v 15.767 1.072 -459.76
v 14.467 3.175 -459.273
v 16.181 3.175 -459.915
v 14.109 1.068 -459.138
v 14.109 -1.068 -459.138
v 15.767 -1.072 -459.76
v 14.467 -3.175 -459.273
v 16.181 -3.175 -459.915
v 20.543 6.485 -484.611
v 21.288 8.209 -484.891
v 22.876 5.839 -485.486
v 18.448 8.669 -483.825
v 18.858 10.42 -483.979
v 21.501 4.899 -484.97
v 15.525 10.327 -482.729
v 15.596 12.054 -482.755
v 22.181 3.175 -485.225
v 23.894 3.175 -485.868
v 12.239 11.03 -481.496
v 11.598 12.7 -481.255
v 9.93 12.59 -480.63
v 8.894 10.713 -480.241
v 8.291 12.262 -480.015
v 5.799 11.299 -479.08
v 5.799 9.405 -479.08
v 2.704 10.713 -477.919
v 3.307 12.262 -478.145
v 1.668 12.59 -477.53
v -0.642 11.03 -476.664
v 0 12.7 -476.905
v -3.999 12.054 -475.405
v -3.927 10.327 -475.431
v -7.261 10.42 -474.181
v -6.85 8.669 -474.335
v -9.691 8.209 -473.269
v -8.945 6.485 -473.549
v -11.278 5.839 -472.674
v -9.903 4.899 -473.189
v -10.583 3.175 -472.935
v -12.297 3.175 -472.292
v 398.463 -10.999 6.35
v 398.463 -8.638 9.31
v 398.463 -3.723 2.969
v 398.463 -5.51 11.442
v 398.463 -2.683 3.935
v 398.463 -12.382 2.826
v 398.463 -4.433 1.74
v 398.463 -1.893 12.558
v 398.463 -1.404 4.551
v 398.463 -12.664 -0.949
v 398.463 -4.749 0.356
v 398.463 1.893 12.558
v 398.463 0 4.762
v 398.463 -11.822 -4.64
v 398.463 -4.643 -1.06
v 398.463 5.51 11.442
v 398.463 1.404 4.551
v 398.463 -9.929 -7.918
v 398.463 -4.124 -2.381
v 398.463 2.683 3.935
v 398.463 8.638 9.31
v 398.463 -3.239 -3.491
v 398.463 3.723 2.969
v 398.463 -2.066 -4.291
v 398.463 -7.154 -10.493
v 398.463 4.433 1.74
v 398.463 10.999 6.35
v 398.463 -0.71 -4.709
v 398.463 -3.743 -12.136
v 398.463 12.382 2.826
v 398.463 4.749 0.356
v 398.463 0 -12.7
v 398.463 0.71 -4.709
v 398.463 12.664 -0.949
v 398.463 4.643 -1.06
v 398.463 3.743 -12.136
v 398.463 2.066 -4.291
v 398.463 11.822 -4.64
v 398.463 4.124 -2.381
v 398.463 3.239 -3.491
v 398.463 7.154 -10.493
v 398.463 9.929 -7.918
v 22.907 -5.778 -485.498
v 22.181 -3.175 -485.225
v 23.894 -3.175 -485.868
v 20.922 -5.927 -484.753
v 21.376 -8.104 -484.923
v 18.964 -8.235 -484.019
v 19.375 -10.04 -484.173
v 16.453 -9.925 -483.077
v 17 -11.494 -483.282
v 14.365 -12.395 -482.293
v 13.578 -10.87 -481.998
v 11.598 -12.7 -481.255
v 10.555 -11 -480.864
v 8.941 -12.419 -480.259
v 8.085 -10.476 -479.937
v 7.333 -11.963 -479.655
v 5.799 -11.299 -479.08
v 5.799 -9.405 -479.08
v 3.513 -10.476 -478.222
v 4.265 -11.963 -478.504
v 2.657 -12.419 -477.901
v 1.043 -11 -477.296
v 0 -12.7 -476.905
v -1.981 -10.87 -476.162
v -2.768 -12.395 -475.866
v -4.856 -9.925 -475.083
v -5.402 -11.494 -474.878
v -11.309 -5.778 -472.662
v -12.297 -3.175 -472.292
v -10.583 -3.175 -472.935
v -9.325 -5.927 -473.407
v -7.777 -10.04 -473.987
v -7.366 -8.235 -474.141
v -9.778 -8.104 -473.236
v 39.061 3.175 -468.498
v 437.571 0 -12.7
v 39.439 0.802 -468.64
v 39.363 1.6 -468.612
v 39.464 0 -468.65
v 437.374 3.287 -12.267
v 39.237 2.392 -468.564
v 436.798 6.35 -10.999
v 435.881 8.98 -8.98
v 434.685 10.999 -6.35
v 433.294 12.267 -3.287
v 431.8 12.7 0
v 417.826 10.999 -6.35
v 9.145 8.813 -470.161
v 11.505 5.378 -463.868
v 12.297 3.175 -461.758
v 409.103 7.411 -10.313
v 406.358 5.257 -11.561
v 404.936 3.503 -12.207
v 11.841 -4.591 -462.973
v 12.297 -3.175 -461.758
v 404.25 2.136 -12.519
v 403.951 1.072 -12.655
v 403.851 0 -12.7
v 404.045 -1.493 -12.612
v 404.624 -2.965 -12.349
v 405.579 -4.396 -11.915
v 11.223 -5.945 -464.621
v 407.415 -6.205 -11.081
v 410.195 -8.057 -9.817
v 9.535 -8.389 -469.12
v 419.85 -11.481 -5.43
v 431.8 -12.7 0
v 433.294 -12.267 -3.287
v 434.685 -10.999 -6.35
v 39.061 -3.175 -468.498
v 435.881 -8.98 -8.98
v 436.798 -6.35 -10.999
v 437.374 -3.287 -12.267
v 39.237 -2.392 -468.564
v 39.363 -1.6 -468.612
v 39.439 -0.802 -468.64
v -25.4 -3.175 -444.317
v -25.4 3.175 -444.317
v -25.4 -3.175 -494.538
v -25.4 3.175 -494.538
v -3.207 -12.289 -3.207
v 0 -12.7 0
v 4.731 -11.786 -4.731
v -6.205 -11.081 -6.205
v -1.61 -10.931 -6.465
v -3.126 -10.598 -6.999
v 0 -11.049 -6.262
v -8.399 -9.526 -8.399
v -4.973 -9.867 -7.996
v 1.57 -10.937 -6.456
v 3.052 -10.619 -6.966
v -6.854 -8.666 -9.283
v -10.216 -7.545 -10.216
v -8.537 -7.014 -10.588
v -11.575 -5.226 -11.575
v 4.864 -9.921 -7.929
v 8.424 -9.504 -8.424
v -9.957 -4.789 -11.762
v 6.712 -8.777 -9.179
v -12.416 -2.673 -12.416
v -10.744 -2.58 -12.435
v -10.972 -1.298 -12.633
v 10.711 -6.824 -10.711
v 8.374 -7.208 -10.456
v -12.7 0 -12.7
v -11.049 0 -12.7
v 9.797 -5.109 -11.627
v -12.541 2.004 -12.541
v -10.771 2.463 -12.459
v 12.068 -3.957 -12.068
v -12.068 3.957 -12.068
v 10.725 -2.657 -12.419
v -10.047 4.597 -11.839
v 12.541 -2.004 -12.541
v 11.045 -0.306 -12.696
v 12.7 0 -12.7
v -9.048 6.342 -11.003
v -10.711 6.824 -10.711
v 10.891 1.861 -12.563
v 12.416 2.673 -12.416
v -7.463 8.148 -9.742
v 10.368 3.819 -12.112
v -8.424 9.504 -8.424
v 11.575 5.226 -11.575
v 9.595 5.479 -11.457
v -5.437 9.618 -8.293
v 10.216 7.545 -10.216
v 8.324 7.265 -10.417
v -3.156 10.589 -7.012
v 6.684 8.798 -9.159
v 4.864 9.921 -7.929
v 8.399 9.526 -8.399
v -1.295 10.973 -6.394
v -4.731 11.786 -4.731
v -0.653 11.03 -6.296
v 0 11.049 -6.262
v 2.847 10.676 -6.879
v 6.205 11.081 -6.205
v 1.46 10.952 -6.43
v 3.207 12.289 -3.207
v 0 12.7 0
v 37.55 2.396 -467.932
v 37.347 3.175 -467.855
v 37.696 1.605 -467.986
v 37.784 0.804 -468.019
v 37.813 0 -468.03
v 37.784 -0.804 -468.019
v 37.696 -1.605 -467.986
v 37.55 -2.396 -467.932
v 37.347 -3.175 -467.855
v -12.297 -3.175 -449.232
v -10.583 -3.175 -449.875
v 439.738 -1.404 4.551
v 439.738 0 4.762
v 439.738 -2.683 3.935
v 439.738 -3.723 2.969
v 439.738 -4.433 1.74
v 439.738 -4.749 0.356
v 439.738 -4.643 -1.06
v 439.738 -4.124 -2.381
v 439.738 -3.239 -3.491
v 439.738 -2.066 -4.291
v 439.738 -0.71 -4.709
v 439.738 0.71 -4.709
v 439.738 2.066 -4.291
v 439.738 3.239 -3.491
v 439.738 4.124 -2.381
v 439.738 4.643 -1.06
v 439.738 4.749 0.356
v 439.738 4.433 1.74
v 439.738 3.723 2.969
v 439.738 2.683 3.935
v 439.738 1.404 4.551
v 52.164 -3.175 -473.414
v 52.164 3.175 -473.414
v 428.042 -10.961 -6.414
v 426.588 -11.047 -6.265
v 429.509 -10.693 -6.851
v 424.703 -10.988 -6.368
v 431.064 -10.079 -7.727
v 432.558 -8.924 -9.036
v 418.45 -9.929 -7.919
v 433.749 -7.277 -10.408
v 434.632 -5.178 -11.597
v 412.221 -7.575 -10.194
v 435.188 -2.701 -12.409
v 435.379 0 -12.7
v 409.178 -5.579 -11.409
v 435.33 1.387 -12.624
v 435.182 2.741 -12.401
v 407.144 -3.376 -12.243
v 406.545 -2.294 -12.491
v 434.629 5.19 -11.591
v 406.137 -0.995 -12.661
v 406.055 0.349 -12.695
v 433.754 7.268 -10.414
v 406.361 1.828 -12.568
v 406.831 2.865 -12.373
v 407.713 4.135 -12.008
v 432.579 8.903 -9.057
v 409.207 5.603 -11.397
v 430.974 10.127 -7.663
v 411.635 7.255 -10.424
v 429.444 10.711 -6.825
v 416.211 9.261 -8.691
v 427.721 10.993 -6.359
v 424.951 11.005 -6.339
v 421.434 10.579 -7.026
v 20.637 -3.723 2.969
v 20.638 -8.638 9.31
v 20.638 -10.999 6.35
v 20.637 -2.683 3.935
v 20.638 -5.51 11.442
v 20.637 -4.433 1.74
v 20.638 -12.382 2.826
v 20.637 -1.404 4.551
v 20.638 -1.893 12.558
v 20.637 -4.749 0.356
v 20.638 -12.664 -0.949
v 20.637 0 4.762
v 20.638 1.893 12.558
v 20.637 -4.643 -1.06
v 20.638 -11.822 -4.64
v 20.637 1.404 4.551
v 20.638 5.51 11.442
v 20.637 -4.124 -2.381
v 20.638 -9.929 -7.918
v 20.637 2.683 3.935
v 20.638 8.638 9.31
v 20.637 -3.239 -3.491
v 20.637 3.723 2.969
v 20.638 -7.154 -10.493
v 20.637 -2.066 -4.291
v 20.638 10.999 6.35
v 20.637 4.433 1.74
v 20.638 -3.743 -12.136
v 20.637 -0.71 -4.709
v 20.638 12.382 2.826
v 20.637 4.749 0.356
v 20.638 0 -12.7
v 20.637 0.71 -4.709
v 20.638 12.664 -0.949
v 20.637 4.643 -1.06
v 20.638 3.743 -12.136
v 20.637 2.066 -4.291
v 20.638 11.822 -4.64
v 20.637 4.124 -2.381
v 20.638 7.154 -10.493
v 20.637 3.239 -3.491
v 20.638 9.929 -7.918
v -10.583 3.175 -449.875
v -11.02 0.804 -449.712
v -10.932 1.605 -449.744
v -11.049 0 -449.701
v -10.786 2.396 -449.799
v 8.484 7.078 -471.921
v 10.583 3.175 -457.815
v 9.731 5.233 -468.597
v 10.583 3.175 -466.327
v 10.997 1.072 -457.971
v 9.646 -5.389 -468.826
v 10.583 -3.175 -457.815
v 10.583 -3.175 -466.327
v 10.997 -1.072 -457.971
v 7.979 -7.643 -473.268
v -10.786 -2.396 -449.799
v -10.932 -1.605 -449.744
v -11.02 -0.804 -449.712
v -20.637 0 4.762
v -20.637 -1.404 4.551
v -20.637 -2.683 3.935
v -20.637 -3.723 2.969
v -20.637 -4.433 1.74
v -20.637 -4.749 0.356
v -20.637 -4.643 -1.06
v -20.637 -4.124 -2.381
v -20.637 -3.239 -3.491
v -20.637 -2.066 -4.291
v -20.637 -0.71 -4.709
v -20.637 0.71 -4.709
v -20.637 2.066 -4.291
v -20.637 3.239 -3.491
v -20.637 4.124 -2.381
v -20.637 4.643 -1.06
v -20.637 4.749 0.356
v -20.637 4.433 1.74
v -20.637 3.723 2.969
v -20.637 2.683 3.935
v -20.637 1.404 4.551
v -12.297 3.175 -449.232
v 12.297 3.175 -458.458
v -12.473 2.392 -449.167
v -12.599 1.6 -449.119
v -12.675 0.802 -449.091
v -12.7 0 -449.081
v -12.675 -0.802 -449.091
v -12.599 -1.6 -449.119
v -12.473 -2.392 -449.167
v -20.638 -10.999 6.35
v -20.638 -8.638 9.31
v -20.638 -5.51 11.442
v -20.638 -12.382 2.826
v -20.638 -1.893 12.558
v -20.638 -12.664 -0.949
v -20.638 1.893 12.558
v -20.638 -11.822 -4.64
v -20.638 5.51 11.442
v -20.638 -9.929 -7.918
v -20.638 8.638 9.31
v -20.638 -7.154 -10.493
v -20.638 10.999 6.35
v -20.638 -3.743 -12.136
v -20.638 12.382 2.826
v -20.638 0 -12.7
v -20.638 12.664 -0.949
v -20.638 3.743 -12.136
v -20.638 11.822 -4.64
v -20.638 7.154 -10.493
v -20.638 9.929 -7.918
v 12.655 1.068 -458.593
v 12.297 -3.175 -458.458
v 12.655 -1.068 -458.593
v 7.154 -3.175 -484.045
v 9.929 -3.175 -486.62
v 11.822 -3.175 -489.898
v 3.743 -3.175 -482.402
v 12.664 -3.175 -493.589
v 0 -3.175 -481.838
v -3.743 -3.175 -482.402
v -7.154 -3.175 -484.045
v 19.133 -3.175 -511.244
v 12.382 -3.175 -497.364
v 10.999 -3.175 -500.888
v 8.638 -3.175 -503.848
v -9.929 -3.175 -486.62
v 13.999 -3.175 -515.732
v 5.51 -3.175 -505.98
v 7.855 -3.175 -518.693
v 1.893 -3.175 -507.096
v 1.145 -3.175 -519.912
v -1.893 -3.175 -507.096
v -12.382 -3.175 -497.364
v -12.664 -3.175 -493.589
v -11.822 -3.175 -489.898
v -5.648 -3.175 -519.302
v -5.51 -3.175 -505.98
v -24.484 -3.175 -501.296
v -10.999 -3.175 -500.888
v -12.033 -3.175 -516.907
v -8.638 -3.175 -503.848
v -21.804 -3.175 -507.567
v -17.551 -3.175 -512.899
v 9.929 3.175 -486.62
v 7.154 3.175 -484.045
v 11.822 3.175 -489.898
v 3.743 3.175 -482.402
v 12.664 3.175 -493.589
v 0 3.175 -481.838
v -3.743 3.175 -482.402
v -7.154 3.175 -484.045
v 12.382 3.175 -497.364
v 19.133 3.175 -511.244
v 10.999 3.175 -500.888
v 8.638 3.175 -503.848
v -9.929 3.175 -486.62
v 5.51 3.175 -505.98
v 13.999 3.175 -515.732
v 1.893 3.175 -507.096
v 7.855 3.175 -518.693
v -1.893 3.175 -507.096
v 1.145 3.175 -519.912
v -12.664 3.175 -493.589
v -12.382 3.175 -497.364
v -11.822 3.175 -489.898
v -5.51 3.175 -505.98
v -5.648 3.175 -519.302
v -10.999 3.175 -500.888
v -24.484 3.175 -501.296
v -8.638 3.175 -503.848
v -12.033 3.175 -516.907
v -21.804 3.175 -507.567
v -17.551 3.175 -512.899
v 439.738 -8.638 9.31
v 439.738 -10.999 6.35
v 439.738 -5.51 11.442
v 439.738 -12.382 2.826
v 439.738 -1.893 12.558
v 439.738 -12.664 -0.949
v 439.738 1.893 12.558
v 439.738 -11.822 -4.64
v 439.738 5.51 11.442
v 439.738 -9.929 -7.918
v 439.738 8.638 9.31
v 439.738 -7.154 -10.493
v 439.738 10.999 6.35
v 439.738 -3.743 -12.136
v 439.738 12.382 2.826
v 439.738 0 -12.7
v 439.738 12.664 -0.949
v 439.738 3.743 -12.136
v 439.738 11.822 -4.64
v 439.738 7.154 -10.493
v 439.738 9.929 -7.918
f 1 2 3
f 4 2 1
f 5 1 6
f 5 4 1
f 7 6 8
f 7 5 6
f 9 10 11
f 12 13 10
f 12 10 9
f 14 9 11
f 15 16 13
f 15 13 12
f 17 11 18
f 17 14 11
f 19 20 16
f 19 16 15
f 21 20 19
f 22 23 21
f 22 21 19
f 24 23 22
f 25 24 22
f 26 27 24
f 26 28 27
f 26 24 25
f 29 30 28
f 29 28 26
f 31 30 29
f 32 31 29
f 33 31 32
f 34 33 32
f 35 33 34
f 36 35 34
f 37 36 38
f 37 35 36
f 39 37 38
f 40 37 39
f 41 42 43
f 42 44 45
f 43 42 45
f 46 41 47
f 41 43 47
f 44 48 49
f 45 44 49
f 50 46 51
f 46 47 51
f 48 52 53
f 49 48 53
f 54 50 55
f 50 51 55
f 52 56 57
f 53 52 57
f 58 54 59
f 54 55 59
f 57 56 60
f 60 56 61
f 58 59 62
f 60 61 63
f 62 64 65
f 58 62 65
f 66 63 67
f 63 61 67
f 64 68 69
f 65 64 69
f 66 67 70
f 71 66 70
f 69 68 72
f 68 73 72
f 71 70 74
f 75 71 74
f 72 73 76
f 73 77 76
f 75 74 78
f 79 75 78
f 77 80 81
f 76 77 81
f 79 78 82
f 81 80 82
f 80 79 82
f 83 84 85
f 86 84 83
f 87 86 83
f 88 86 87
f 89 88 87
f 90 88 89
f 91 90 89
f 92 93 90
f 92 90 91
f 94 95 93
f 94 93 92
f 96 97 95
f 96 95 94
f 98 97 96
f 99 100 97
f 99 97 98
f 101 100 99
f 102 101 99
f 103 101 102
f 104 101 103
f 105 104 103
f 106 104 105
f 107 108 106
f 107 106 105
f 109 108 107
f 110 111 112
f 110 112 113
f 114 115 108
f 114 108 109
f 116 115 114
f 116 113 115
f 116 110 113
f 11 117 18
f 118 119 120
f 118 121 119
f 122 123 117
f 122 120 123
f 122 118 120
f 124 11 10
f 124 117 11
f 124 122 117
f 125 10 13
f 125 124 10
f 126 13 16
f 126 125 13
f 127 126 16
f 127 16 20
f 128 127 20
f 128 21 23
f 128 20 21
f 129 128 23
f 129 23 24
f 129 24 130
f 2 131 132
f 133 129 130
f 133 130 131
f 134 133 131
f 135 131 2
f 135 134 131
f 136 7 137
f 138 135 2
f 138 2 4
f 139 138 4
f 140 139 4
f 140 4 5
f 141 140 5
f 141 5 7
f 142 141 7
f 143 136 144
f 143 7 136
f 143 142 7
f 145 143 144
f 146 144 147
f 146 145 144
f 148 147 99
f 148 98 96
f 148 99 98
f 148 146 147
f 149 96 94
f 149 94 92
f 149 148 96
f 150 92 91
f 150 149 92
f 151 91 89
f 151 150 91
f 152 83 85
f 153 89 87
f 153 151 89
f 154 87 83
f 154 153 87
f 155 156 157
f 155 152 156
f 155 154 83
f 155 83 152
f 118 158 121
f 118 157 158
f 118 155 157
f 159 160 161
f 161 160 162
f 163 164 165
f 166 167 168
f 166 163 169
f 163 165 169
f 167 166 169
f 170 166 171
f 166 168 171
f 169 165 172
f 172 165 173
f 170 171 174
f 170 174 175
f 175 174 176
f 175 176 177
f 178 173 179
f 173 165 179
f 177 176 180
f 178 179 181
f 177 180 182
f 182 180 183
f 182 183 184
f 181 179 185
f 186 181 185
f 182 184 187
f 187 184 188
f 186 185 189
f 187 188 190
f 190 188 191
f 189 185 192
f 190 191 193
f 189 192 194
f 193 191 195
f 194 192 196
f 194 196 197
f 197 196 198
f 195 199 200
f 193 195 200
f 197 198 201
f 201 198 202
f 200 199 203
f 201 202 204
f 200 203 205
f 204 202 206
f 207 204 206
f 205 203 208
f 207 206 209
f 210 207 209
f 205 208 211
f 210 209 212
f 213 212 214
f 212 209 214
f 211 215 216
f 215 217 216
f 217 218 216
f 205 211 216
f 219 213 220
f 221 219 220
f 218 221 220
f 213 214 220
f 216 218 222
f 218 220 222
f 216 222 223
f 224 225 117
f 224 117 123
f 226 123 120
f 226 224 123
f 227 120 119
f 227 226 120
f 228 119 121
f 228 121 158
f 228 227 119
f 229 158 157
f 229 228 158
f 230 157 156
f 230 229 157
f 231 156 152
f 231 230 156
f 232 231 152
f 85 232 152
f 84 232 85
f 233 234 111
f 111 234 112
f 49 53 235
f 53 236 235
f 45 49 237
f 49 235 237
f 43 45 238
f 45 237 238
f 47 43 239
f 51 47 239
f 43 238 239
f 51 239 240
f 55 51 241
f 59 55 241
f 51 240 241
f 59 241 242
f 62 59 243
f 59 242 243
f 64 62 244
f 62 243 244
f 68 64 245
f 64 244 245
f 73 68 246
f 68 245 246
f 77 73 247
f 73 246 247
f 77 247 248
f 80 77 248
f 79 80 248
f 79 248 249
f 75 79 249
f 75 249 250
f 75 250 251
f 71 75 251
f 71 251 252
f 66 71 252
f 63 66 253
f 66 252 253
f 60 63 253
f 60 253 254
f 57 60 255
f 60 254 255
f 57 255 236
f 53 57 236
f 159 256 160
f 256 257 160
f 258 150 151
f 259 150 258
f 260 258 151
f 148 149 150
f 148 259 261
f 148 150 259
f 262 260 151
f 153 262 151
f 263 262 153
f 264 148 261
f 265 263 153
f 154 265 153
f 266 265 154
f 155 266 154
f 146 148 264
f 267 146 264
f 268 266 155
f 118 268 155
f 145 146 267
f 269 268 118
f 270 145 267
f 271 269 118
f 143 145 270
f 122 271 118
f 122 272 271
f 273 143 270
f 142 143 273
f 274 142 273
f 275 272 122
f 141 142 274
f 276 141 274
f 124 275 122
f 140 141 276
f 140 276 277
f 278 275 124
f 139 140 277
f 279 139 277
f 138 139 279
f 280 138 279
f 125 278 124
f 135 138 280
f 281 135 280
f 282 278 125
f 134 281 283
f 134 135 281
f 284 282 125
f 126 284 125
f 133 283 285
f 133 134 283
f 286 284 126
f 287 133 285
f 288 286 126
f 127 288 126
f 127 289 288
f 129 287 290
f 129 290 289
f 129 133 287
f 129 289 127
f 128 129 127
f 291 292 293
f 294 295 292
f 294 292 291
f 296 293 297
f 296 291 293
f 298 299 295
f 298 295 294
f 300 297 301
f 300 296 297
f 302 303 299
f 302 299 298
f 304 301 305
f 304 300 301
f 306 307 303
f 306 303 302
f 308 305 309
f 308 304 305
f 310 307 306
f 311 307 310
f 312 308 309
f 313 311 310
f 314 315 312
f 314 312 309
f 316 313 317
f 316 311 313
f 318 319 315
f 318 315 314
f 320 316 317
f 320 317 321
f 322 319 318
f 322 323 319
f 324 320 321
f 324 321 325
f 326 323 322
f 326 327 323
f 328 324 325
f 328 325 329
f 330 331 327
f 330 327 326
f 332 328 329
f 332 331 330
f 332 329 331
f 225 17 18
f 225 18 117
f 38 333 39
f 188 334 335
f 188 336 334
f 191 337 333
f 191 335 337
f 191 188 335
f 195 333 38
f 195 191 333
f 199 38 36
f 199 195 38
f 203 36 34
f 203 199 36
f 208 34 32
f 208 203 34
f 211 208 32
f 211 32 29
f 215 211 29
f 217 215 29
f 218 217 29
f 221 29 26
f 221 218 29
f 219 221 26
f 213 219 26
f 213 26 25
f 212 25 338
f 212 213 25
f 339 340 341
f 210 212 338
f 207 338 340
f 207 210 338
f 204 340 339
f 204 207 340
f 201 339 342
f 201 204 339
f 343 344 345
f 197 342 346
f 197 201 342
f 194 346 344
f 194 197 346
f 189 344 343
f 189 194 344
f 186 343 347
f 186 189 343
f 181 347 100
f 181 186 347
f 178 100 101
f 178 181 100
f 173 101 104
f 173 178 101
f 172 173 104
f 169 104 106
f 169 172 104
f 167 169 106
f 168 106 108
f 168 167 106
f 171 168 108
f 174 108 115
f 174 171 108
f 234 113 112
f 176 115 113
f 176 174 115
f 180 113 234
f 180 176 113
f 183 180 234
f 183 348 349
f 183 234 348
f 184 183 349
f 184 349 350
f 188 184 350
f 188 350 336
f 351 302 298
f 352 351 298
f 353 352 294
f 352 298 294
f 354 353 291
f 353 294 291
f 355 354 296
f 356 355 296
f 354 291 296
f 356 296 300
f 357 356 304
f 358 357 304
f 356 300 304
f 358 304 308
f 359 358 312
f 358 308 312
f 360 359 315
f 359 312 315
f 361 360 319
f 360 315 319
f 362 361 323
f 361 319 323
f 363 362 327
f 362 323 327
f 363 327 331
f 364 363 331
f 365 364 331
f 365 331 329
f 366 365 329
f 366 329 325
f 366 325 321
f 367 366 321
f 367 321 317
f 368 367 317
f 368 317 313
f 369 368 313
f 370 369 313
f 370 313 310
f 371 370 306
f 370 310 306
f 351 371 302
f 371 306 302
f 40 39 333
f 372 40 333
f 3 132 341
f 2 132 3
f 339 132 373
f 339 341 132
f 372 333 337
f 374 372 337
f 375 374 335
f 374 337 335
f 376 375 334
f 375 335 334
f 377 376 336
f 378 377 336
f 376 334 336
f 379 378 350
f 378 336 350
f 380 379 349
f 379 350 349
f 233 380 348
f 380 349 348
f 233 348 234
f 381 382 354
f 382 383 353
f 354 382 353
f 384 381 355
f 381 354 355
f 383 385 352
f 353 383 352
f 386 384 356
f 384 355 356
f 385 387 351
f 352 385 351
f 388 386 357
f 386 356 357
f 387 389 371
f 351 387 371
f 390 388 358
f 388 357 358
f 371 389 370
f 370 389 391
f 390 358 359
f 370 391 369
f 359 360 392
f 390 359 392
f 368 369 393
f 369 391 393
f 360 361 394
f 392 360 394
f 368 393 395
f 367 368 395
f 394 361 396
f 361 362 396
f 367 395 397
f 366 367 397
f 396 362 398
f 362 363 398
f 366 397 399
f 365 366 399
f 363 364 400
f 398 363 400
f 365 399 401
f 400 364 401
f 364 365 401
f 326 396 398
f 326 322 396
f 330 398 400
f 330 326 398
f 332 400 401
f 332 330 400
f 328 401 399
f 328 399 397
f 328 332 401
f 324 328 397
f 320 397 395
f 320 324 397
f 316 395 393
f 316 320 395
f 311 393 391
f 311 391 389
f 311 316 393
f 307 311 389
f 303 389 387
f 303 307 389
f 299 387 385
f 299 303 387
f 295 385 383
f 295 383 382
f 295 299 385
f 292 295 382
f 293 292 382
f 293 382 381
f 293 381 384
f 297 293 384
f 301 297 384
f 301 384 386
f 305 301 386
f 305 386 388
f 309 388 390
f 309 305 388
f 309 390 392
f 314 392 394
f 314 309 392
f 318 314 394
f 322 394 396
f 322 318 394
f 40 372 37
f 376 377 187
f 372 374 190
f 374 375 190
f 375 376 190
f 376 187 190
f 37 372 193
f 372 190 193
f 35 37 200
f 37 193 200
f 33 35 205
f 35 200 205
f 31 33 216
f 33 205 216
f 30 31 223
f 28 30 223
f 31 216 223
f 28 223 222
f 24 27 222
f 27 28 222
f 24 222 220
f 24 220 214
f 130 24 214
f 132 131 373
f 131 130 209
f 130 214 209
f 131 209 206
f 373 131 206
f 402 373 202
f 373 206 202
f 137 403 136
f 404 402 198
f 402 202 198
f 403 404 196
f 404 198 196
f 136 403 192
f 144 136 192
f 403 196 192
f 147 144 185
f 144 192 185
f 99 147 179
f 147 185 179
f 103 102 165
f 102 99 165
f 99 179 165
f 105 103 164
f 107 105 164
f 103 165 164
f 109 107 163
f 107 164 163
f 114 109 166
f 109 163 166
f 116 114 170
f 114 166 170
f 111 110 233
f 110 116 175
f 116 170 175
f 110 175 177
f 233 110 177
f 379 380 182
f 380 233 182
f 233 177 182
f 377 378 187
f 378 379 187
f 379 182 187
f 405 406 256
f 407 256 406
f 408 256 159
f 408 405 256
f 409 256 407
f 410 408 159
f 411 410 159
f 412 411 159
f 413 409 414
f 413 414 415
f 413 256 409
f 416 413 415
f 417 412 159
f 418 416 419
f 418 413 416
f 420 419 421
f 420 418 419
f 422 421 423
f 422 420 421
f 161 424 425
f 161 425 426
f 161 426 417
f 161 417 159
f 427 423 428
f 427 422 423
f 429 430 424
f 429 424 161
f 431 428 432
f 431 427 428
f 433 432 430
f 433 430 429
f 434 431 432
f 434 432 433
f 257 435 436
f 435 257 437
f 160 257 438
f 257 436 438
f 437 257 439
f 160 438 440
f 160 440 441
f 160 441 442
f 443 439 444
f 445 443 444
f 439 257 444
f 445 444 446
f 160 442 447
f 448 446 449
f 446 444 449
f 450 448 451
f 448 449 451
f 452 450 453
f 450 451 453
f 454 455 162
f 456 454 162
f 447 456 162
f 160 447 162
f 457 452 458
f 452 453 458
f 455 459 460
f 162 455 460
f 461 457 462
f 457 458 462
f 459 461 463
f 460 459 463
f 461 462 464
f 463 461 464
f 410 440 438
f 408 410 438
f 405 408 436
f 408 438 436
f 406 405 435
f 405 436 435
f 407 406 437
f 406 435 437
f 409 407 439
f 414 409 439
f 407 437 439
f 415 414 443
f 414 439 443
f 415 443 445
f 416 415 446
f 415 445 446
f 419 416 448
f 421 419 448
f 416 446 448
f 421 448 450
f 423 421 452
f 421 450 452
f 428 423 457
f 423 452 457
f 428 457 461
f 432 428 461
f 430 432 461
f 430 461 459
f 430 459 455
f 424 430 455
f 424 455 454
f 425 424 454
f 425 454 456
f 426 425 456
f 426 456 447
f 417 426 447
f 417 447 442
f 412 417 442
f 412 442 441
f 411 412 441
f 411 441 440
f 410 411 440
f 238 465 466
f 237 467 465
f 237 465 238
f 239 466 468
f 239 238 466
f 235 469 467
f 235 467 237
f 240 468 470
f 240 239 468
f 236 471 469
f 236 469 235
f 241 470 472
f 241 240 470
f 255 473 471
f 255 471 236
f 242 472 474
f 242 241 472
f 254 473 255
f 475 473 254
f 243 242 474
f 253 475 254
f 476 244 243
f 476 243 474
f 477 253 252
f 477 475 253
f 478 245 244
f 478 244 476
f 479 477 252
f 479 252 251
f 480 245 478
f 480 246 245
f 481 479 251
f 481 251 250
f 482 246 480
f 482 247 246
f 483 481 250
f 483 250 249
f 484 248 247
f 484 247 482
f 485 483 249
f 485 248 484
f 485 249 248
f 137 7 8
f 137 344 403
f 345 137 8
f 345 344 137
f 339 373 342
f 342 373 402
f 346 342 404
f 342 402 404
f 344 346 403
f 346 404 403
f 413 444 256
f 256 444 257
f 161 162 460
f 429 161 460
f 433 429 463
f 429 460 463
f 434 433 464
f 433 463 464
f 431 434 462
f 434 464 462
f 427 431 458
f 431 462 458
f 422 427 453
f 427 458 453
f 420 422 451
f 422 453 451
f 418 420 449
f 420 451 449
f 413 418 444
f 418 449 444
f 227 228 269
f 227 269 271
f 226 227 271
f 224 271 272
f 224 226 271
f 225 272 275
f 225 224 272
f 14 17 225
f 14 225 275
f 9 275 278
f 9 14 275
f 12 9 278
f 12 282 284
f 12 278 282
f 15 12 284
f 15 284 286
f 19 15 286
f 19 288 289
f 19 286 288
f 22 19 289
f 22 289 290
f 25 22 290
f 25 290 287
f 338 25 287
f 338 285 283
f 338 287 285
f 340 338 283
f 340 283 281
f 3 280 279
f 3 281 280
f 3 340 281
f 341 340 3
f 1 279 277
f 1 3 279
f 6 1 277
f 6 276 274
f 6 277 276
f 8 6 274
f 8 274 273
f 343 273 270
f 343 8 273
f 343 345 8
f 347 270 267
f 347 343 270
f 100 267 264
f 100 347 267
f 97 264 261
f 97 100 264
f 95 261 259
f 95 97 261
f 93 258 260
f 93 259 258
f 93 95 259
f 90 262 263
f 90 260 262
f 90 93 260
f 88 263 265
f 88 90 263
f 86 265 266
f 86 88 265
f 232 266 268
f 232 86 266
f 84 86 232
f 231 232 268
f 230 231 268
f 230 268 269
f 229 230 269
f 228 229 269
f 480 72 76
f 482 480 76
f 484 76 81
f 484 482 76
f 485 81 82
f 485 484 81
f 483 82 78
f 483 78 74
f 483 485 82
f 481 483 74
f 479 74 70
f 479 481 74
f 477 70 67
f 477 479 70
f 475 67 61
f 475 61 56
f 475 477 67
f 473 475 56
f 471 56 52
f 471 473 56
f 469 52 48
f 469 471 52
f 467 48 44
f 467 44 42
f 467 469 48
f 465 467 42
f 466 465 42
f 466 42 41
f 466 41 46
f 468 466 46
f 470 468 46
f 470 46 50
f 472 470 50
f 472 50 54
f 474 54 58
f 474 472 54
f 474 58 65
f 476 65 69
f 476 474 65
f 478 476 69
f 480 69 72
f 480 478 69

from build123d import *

# Parameters (mm, degrees)
SKETCH11_ON_SEGMENT_1_R         = 12.7
SKETCH11_ON_SEGMENT_1_R_2       = 11.049
STRUCTURAL_MEMBER1_DEPTH        = 543.415718856
SKETCH11_R                      = 12.7
SKETCH11_R_2                    = 11.049
STRUCTURAL_MEMBER1_2_DEPTH      = 656.520428809
STRUCTURAL_MEMBER1_2_DEPTH_BACK = 48.877718856
CUT_EXTRUDE1_DEPTH              = 670.227159455
CUT_EXTRUDE1_DEPTH_BACK         = 670.227159455
BOSS_EXTRUDE1_DEPTH             = 3.175
BOSS_EXTRUDE1_DEPTH_BACK        = 3.175
SKETCH16_R                      = 12.7
CUT_EXTRUDE2_DEPTH              = 683.129929993
CUT_EXTRUDE2_DEPTH_BACK         = 683.129929993
SKETCH17_R                      = 12.7
BOSS_EXTRUDE2_DEPTH             = 20.6375
BOSS_EXTRUDE2_DEPTH_BACK        = 20.6375
SKETCH18_R                      = 12.7
BOSS_EXTRUDE3_DEPTH             = 7.9375
BOSS_EXTRUDE3_DEPTH_BACK        = 33.3375
SKETCH19_W                      = 4.7625
SKETCH19_H                      = 460.375
SKETCH22_R                      = 12.7
CUT_EXTRUDE3_DEPTH              = 682.143603345
CUT_EXTRUDE3_DEPTH_BACK         = 682.143603345


with BuildPart() as part:
    # Sketch11 on segment 1 (carried to segment 1) → Structural Member1 (new body)
    with BuildSketch(Plane(origin=(0, 0, 0), x_dir=(-1, 0, 0), z_dir=(0, 0, -1))):
        Circle(SKETCH11_ON_SEGMENT_1_R)
        Circle(SKETCH11_ON_SEGMENT_1_R_2, mode=Mode.SUBTRACT)
    extrude(amount=STRUCTURAL_MEMBER1_DEPTH)

    # Structural Member1 mitre 1
    split(bisect_by=Plane(origin=(0, 0, -494.538), x_dir=(0, -1, 0), z_dir=(-0.936288231, 0, 0.351232612)), keep=Keep.TOP)


with BuildPart() as body_2:
    # Sketch11 → Structural Member1 2 (new, two sides)
    with BuildSketch(Plane(origin=(0, 0, -494.538), x_dir=(0.7532713047435399, 0, -0.6577099219640564), z_dir=(0.6577099219640563, 0, 0.7532713047435398))) as structural_member1_2_sk:
        Circle(SKETCH11_R)
        Circle(SKETCH11_R_2, mode=Mode.SUBTRACT)
    extrude(amount=STRUCTURAL_MEMBER1_2_DEPTH)
    extrude(structural_member1_2_sk.sketch, amount=-STRUCTURAL_MEMBER1_2_DEPTH_BACK)

    # Structural Member1 2 mitre 1
    split(bisect_by=Plane(origin=(0, 0, -494.538), x_dir=(0, 1, 0), z_dir=(0.936288231, 0, -0.351232612)), keep=Keep.TOP)


with BuildPart() as part_1:
    add(part.part)

    # Structural Member1 as one body: union body 2
    add(body_2.part)

    # Sketch13 → Cut-Extrude1 (cut, two sides)
    with BuildSketch(Plane(origin=(0, 0, -494.538), x_dir=(0.35123261185178917, 0, 0.9362882314606814), z_dir=(-0.9362882314606813, 0, 0.3512326118517891))) as cut_extrude1_sk:
        Polygon((16.51, 3.175), (38.1, 3.175), (38.1, -3.175), (16.51, -3.175), (16.51, -12.7), (-36.1583736, -12.7), (-36.1583736, 12.7), (16.51, 12.7), align=None)
    extrude(amount=CUT_EXTRUDE1_DEPTH, mode=Mode.SUBTRACT)
    extrude(cut_extrude1_sk.sketch, amount=-CUT_EXTRUDE1_DEPTH_BACK, mode=Mode.SUBTRACT)

    # Sketch16 → Cut-Extrude2 (cut, two sides)
    with BuildSketch(Plane(origin=(0, 0, 0), x_dir=(0, 0, -1), z_dir=(1, 0, 0))) as cut_extrude2_sk:
        Circle(SKETCH16_R)
    extrude(amount=CUT_EXTRUDE2_DEPTH, mode=Mode.SUBTRACT)
    extrude(cut_extrude2_sk.sketch, amount=-CUT_EXTRUDE2_DEPTH_BACK, mode=Mode.SUBTRACT)


with BuildPart() as body_2_2:
    # Sketch12 → Boss-Extrude1 (new, two sides)
    with BuildSketch(Plane(origin=(0, 0, 0), x_dir=(1, 0, 0), z_dir=(0, 1, 0))) as boss_extrude1_sk:
        with BuildLine():
            Line((19.13309114, 511.243832018), (52.163925023, 473.413812271))
            Line((52.163925023, 473.413812271), (-25.4, 444.317024492))
            Line((-25.4, 444.317024492), (-25.4, 494.538))
            ThreePointArc((-25.4, 494.538), (-8.921308341, 518.319721079), (19.13309114, 511.243832018))
        make_face()
    extrude(amount=BOSS_EXTRUDE1_DEPTH)
    extrude(boss_extrude1_sk.sketch, amount=-BOSS_EXTRUDE1_DEPTH_BACK)

    # Sketch22 → Cut-Extrude3 (cut, two sides)
    with BuildSketch(Plane(origin=(0, 3.175, 0), x_dir=(1, 0, 0), z_dir=(0, 1, 0))) as cut_extrude3_sk:
        with Locations(Location((0, 494.538, 0), (0, 0, 270))):
            Circle(SKETCH22_R)
    extrude(amount=CUT_EXTRUDE3_DEPTH, mode=Mode.SUBTRACT)
    extrude(cut_extrude3_sk.sketch, amount=-CUT_EXTRUDE3_DEPTH_BACK, mode=Mode.SUBTRACT)


with BuildPart() as body_3:
    # Sketch17 → Boss-Extrude2 (new, two sides)
    with BuildSketch(Plane(origin=(0, 0, 0), x_dir=(0, 0, -1), z_dir=(1, 0, 0))) as boss_extrude2_sk:
        Circle(SKETCH17_R)
    extrude(amount=BOSS_EXTRUDE2_DEPTH)
    extrude(boss_extrude2_sk.sketch, amount=-BOSS_EXTRUDE2_DEPTH_BACK)


with BuildPart() as body_4:
    # Sketch18 → Boss-Extrude3 (new, two sides)
    with BuildSketch(Plane(origin=(431.8, 0, 0), x_dir=(0, 0, -1), z_dir=(1, 0, 0))) as boss_extrude3_sk:
        Circle(SKETCH18_R)
    extrude(amount=BOSS_EXTRUDE3_DEPTH)
    extrude(boss_extrude3_sk.sketch, amount=-BOSS_EXTRUDE3_DEPTH_BACK)


with BuildPart() as f_1_2_0_5_diameter_hole2_tool:
    # Sketch19 → 1_2 _0.5_ Diameter Hole2 (revolve)
    with BuildSketch(Plane(origin=(-20.6375, 0, 0), x_dir=(0, 0, 1), z_dir=(0, 1, 0))):
        with Locations((2.38125, 230.1875)):
            Rectangle(SKETCH19_W, SKETCH19_H)
    revolve(axis=Axis((-26.9875, 0, 0), (1, 0, 0)))


with BuildPart() as body_3_1:
    add(body_3.part)

    # 1_2 _0.5_ Diameter Hole2: cut by f_1_2_0_5_diameter_hole2_tool
    add(f_1_2_0_5_diameter_hole2_tool.part, mode=Mode.SUBTRACT)


with BuildPart() as body_4_1:
    add(body_4.part)

    # 1_2 _0.5_ Diameter Hole2: cut by f_1_2_0_5_diameter_hole2_tool
    add(f_1_2_0_5_diameter_hole2_tool.part, mode=Mode.SUBTRACT)


solid = Compound([part_1.part, body_2_2.part, body_3_1.part, body_4_1.part])
